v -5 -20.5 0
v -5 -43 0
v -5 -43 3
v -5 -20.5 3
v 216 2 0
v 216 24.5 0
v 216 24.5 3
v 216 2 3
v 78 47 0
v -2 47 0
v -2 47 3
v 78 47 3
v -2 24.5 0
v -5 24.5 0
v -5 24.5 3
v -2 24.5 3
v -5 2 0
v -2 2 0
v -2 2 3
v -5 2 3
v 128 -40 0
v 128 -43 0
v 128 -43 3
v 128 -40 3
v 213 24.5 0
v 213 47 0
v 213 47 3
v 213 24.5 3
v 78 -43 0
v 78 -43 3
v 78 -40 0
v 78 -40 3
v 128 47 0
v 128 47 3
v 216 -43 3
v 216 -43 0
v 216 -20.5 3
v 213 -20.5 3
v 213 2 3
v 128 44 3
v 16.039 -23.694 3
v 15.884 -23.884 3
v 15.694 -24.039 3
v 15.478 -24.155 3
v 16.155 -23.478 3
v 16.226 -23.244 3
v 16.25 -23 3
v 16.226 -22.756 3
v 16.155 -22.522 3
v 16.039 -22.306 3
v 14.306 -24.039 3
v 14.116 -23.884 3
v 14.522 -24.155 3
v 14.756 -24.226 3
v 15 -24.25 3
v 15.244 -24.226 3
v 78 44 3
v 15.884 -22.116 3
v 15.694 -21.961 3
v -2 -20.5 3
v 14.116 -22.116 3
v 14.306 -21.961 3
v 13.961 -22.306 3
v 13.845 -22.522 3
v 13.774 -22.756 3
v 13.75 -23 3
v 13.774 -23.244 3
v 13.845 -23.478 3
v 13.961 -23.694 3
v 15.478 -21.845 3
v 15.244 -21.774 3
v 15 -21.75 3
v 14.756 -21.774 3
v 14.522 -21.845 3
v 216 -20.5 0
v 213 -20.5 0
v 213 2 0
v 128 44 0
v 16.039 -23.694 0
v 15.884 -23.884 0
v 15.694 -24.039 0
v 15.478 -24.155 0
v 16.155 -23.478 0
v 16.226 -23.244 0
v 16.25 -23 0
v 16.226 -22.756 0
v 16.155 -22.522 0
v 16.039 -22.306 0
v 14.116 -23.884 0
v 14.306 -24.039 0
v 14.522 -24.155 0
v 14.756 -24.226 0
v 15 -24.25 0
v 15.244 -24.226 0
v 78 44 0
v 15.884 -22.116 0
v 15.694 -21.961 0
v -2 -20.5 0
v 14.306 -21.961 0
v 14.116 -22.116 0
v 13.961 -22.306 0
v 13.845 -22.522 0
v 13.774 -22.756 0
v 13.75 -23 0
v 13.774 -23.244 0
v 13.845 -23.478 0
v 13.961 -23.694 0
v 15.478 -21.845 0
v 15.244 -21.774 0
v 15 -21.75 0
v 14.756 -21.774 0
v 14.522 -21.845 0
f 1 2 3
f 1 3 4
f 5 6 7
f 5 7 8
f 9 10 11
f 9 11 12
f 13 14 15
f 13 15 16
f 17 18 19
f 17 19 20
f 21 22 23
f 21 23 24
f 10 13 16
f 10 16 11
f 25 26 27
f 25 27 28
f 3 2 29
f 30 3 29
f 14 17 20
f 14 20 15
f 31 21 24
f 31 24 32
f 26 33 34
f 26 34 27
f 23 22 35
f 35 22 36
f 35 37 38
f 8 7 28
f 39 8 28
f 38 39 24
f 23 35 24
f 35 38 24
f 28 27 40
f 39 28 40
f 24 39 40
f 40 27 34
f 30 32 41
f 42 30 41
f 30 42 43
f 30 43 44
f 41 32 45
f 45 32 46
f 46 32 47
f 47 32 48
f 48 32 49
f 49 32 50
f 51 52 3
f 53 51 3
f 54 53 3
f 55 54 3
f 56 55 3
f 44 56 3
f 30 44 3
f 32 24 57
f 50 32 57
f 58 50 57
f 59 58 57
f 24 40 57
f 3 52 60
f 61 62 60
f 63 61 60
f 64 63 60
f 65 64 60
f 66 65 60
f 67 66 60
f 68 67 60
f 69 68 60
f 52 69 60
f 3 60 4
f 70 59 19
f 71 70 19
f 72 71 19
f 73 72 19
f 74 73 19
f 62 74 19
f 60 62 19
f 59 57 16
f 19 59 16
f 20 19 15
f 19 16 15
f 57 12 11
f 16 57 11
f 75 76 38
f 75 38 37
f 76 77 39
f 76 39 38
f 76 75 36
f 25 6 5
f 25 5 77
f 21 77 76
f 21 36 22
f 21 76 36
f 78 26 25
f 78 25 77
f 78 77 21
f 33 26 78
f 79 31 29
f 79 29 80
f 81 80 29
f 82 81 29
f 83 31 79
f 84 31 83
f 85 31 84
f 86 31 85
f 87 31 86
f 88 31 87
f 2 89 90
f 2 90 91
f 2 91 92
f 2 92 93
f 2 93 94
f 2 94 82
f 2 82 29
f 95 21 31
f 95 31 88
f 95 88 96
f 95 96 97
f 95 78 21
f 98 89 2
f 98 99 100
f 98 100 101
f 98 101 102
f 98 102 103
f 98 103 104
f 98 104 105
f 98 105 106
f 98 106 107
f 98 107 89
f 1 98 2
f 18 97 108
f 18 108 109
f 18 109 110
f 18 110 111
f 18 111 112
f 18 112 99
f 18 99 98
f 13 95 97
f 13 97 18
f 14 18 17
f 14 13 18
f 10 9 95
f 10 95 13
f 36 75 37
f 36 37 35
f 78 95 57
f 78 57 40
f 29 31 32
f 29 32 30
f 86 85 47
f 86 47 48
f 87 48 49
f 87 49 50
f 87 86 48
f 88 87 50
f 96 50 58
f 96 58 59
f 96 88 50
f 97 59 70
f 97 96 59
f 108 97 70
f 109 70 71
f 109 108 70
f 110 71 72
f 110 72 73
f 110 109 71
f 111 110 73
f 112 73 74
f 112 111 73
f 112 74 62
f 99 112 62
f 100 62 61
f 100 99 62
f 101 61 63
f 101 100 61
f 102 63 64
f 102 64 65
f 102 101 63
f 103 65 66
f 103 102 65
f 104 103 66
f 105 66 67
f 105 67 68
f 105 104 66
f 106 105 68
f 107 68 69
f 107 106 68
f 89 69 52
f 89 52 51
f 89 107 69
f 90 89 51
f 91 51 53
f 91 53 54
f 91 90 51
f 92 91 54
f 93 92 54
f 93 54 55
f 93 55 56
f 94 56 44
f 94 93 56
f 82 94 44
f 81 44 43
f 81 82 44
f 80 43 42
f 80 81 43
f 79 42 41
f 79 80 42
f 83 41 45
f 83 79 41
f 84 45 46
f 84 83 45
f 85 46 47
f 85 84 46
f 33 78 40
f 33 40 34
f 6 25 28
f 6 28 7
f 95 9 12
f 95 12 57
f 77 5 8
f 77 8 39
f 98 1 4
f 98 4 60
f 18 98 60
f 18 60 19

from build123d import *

# Parameters (mm, degrees)
SKETCH1_R           = 1.25
BOSS_EXTRUDE1_DEPTH = 3


with BuildPart() as part:
    # Sketch1 → Boss-Extrude1 (new body)
    with BuildSketch(Plane.XY):
        Polygon((-2, 47), (78, 47), (78, 44), (128, 44), (128, 47), (213, 47), (213, 24.5), (216, 24.5), (216, 2), (213, 2), (213, -20.5), (216, -20.5), (216, -43), (213, -43), (128, -43), (128, -40), (78, -40), (78, -43), (-2, -43), (-5, -43), (-5, -20.5), (-2, -20.5), (-2, 2), (-5, 2), (-5, 24.5), (-2, 24.5), align=None)
        with Locations((15, -23)):
            Circle(SKETCH1_R, mode=Mode.SUBTRACT)
    extrude(amount=BOSS_EXTRUDE1_DEPTH)


solid = part.part
